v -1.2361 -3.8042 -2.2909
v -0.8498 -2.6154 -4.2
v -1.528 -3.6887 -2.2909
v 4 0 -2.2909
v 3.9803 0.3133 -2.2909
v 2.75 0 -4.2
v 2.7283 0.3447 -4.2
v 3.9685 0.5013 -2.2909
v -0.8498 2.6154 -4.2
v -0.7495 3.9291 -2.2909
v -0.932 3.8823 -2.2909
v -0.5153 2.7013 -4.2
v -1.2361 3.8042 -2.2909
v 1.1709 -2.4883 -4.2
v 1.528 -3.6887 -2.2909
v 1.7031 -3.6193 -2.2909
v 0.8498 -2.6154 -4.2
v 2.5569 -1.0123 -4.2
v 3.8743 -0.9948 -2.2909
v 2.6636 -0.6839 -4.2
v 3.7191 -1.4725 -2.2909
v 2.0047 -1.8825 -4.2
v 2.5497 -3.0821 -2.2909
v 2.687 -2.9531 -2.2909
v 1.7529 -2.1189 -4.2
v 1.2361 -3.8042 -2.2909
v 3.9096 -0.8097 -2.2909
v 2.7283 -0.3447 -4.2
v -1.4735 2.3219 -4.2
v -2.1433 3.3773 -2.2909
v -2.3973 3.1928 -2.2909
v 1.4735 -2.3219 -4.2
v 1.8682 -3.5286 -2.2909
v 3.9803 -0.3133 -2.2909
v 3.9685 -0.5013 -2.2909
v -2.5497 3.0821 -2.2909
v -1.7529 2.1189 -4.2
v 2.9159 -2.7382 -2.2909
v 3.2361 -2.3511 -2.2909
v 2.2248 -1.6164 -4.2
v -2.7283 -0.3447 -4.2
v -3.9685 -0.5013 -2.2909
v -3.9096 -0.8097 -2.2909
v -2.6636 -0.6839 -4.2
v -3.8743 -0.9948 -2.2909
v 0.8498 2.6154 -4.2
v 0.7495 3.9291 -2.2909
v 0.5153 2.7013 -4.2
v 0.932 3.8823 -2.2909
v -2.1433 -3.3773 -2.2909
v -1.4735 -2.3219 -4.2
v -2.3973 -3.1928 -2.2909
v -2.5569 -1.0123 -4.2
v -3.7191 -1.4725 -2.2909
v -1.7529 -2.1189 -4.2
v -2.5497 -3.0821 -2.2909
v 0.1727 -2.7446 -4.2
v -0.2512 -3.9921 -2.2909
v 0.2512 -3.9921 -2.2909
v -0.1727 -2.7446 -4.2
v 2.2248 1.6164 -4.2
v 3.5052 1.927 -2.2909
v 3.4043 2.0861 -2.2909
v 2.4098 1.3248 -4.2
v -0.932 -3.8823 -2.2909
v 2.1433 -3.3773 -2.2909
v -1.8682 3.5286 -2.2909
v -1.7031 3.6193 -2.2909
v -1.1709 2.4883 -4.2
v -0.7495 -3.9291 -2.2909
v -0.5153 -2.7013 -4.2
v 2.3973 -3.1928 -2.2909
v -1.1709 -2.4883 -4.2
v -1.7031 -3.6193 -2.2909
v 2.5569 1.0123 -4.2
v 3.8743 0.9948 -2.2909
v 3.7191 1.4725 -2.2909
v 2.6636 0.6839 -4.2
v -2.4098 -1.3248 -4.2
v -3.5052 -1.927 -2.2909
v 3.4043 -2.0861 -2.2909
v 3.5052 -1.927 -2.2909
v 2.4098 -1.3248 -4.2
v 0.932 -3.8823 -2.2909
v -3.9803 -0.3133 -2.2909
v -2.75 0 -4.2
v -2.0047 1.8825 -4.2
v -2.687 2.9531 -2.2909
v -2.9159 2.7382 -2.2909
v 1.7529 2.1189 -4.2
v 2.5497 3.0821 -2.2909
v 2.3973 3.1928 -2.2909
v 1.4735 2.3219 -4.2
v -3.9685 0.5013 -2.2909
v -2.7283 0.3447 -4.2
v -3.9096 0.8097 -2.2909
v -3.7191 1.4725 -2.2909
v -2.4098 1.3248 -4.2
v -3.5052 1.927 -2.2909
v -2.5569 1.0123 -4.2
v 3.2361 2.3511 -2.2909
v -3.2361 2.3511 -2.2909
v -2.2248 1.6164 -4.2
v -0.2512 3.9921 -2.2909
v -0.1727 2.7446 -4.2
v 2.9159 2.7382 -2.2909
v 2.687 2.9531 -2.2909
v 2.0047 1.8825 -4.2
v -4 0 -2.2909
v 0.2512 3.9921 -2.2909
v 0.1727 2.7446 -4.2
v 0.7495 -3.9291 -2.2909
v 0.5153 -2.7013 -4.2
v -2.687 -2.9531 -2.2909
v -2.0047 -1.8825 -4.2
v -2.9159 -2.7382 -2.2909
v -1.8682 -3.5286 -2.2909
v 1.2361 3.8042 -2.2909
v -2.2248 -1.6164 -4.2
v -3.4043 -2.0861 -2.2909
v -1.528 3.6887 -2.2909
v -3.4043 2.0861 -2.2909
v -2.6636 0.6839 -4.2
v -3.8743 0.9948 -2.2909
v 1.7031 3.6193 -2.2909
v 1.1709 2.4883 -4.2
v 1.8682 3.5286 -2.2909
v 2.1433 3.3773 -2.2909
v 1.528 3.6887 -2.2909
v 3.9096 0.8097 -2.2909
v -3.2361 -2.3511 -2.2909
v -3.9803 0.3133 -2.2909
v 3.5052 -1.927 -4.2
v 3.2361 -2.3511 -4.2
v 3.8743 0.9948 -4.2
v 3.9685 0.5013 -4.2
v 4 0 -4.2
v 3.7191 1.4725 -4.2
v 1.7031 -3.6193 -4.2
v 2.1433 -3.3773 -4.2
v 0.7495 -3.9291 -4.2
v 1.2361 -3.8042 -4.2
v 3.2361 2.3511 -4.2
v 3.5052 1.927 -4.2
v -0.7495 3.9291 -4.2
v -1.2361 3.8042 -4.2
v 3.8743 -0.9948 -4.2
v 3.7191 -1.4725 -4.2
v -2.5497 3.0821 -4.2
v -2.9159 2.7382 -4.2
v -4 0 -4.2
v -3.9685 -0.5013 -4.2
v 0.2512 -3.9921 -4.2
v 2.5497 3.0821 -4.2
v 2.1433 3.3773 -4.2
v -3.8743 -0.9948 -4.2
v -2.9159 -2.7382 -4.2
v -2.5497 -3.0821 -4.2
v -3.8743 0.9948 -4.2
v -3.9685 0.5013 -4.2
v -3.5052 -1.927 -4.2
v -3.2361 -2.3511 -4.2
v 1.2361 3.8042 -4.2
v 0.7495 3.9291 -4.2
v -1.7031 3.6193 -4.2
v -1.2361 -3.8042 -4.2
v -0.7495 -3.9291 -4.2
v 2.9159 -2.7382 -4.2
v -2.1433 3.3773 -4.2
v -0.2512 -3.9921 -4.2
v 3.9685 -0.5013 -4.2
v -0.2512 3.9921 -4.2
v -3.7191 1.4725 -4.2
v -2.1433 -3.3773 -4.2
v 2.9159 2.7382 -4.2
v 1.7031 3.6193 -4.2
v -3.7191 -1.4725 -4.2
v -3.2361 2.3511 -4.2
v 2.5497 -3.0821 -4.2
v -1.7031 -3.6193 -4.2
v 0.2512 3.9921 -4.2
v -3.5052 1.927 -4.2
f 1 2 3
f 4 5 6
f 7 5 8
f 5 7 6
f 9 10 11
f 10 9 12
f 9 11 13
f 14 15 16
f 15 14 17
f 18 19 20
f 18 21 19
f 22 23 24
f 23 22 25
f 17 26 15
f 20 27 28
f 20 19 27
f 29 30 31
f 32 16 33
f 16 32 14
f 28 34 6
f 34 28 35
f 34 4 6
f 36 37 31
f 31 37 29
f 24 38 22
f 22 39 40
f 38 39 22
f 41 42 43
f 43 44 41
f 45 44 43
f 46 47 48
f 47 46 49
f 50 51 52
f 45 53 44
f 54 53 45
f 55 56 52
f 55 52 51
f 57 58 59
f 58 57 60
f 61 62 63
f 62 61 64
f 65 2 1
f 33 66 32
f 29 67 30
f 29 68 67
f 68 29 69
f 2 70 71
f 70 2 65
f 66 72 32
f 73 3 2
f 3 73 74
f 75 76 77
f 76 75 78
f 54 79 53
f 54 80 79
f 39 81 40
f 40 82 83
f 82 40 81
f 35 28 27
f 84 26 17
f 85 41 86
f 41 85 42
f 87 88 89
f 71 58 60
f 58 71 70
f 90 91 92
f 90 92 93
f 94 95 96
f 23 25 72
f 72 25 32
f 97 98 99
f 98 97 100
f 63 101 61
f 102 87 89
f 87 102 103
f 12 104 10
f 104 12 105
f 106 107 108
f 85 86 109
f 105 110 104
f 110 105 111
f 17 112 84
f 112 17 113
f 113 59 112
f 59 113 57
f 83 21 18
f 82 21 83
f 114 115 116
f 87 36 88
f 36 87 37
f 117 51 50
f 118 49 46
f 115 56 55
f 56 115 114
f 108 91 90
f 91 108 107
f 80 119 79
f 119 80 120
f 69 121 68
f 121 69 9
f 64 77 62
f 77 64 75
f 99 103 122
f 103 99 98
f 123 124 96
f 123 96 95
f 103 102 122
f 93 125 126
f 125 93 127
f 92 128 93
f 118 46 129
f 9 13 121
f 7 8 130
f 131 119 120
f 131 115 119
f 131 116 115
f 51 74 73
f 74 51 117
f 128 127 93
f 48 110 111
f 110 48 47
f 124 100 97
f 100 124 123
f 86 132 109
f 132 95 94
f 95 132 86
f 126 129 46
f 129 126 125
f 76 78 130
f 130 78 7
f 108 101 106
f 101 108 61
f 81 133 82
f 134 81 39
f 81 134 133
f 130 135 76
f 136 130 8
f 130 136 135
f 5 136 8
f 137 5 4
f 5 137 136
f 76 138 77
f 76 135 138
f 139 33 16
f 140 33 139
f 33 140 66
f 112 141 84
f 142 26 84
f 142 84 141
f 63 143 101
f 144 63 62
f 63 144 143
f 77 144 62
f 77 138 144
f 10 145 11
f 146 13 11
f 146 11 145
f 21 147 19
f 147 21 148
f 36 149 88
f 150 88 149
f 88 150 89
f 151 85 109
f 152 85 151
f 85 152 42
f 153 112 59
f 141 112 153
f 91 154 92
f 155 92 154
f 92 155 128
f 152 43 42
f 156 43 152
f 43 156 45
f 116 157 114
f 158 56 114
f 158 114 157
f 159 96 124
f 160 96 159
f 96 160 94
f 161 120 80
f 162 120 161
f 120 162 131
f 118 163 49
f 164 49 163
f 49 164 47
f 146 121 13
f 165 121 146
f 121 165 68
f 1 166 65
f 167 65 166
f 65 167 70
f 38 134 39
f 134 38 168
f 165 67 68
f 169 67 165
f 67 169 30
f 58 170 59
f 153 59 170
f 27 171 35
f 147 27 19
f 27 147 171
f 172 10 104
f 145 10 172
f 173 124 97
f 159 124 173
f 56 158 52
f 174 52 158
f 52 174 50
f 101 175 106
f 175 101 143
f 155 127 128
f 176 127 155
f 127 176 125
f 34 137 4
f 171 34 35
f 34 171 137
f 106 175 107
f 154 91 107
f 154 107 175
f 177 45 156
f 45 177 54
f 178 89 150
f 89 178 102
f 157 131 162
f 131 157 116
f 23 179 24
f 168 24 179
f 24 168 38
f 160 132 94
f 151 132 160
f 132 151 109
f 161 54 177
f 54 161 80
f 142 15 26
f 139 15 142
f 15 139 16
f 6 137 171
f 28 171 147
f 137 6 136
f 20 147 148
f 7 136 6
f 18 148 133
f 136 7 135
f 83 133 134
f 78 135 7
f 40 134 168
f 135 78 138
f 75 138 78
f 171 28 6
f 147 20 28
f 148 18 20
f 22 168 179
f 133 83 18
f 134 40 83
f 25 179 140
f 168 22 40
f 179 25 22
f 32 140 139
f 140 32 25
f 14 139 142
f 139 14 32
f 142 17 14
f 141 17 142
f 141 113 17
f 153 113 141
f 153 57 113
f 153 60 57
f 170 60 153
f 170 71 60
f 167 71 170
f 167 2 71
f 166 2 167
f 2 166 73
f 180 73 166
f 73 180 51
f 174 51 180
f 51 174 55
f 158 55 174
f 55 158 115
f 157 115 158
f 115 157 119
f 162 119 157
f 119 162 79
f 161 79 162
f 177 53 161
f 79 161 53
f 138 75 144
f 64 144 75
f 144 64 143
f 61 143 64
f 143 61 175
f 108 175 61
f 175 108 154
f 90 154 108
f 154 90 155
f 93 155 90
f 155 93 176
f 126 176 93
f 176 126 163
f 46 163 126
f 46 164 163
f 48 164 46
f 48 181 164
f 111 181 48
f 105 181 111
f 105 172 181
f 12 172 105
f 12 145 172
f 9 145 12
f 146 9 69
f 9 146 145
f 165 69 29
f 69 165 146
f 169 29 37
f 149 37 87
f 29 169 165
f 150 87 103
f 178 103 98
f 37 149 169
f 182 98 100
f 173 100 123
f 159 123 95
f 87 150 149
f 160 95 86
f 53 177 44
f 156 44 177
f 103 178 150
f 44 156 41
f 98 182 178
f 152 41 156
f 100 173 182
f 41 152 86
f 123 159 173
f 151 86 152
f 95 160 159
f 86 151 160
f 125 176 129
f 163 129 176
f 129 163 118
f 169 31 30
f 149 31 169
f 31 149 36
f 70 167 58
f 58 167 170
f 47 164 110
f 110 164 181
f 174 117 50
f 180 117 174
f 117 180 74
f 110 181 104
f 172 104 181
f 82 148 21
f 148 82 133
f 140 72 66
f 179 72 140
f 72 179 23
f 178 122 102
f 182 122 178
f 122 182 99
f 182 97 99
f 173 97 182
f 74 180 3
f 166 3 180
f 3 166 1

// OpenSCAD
$fn = 50;

difference() {
	union() {
		translate(v = [0, 0, -4.2]) {
			cylinder(h = 4.2, r = 4.0);
		}
	}
	union() {
		translate(v = [0, 0, 0]) {
			rotate(a = [0, 0, 0]) {
				difference() {
					union() {
						translate(v = [0, 0, -7.2]) {
							cylinder(h = 7.2, r = 2.25);
						}
						translate(v = [0, 0, -4.2]) {
							cylinder(h = 4.2, r1 = 2.75, r2 = 5.5);
						}
						translate(v = [0, 0, -7.2]) {
							cylinder(h = 7.2, r = 2.75);
						}
						translate(v = [0, 0, -7.2]) {
							cylinder(h = 7.2, r = 2.25);
						}
					}
					union();
				}
			}
		}
	}
}
